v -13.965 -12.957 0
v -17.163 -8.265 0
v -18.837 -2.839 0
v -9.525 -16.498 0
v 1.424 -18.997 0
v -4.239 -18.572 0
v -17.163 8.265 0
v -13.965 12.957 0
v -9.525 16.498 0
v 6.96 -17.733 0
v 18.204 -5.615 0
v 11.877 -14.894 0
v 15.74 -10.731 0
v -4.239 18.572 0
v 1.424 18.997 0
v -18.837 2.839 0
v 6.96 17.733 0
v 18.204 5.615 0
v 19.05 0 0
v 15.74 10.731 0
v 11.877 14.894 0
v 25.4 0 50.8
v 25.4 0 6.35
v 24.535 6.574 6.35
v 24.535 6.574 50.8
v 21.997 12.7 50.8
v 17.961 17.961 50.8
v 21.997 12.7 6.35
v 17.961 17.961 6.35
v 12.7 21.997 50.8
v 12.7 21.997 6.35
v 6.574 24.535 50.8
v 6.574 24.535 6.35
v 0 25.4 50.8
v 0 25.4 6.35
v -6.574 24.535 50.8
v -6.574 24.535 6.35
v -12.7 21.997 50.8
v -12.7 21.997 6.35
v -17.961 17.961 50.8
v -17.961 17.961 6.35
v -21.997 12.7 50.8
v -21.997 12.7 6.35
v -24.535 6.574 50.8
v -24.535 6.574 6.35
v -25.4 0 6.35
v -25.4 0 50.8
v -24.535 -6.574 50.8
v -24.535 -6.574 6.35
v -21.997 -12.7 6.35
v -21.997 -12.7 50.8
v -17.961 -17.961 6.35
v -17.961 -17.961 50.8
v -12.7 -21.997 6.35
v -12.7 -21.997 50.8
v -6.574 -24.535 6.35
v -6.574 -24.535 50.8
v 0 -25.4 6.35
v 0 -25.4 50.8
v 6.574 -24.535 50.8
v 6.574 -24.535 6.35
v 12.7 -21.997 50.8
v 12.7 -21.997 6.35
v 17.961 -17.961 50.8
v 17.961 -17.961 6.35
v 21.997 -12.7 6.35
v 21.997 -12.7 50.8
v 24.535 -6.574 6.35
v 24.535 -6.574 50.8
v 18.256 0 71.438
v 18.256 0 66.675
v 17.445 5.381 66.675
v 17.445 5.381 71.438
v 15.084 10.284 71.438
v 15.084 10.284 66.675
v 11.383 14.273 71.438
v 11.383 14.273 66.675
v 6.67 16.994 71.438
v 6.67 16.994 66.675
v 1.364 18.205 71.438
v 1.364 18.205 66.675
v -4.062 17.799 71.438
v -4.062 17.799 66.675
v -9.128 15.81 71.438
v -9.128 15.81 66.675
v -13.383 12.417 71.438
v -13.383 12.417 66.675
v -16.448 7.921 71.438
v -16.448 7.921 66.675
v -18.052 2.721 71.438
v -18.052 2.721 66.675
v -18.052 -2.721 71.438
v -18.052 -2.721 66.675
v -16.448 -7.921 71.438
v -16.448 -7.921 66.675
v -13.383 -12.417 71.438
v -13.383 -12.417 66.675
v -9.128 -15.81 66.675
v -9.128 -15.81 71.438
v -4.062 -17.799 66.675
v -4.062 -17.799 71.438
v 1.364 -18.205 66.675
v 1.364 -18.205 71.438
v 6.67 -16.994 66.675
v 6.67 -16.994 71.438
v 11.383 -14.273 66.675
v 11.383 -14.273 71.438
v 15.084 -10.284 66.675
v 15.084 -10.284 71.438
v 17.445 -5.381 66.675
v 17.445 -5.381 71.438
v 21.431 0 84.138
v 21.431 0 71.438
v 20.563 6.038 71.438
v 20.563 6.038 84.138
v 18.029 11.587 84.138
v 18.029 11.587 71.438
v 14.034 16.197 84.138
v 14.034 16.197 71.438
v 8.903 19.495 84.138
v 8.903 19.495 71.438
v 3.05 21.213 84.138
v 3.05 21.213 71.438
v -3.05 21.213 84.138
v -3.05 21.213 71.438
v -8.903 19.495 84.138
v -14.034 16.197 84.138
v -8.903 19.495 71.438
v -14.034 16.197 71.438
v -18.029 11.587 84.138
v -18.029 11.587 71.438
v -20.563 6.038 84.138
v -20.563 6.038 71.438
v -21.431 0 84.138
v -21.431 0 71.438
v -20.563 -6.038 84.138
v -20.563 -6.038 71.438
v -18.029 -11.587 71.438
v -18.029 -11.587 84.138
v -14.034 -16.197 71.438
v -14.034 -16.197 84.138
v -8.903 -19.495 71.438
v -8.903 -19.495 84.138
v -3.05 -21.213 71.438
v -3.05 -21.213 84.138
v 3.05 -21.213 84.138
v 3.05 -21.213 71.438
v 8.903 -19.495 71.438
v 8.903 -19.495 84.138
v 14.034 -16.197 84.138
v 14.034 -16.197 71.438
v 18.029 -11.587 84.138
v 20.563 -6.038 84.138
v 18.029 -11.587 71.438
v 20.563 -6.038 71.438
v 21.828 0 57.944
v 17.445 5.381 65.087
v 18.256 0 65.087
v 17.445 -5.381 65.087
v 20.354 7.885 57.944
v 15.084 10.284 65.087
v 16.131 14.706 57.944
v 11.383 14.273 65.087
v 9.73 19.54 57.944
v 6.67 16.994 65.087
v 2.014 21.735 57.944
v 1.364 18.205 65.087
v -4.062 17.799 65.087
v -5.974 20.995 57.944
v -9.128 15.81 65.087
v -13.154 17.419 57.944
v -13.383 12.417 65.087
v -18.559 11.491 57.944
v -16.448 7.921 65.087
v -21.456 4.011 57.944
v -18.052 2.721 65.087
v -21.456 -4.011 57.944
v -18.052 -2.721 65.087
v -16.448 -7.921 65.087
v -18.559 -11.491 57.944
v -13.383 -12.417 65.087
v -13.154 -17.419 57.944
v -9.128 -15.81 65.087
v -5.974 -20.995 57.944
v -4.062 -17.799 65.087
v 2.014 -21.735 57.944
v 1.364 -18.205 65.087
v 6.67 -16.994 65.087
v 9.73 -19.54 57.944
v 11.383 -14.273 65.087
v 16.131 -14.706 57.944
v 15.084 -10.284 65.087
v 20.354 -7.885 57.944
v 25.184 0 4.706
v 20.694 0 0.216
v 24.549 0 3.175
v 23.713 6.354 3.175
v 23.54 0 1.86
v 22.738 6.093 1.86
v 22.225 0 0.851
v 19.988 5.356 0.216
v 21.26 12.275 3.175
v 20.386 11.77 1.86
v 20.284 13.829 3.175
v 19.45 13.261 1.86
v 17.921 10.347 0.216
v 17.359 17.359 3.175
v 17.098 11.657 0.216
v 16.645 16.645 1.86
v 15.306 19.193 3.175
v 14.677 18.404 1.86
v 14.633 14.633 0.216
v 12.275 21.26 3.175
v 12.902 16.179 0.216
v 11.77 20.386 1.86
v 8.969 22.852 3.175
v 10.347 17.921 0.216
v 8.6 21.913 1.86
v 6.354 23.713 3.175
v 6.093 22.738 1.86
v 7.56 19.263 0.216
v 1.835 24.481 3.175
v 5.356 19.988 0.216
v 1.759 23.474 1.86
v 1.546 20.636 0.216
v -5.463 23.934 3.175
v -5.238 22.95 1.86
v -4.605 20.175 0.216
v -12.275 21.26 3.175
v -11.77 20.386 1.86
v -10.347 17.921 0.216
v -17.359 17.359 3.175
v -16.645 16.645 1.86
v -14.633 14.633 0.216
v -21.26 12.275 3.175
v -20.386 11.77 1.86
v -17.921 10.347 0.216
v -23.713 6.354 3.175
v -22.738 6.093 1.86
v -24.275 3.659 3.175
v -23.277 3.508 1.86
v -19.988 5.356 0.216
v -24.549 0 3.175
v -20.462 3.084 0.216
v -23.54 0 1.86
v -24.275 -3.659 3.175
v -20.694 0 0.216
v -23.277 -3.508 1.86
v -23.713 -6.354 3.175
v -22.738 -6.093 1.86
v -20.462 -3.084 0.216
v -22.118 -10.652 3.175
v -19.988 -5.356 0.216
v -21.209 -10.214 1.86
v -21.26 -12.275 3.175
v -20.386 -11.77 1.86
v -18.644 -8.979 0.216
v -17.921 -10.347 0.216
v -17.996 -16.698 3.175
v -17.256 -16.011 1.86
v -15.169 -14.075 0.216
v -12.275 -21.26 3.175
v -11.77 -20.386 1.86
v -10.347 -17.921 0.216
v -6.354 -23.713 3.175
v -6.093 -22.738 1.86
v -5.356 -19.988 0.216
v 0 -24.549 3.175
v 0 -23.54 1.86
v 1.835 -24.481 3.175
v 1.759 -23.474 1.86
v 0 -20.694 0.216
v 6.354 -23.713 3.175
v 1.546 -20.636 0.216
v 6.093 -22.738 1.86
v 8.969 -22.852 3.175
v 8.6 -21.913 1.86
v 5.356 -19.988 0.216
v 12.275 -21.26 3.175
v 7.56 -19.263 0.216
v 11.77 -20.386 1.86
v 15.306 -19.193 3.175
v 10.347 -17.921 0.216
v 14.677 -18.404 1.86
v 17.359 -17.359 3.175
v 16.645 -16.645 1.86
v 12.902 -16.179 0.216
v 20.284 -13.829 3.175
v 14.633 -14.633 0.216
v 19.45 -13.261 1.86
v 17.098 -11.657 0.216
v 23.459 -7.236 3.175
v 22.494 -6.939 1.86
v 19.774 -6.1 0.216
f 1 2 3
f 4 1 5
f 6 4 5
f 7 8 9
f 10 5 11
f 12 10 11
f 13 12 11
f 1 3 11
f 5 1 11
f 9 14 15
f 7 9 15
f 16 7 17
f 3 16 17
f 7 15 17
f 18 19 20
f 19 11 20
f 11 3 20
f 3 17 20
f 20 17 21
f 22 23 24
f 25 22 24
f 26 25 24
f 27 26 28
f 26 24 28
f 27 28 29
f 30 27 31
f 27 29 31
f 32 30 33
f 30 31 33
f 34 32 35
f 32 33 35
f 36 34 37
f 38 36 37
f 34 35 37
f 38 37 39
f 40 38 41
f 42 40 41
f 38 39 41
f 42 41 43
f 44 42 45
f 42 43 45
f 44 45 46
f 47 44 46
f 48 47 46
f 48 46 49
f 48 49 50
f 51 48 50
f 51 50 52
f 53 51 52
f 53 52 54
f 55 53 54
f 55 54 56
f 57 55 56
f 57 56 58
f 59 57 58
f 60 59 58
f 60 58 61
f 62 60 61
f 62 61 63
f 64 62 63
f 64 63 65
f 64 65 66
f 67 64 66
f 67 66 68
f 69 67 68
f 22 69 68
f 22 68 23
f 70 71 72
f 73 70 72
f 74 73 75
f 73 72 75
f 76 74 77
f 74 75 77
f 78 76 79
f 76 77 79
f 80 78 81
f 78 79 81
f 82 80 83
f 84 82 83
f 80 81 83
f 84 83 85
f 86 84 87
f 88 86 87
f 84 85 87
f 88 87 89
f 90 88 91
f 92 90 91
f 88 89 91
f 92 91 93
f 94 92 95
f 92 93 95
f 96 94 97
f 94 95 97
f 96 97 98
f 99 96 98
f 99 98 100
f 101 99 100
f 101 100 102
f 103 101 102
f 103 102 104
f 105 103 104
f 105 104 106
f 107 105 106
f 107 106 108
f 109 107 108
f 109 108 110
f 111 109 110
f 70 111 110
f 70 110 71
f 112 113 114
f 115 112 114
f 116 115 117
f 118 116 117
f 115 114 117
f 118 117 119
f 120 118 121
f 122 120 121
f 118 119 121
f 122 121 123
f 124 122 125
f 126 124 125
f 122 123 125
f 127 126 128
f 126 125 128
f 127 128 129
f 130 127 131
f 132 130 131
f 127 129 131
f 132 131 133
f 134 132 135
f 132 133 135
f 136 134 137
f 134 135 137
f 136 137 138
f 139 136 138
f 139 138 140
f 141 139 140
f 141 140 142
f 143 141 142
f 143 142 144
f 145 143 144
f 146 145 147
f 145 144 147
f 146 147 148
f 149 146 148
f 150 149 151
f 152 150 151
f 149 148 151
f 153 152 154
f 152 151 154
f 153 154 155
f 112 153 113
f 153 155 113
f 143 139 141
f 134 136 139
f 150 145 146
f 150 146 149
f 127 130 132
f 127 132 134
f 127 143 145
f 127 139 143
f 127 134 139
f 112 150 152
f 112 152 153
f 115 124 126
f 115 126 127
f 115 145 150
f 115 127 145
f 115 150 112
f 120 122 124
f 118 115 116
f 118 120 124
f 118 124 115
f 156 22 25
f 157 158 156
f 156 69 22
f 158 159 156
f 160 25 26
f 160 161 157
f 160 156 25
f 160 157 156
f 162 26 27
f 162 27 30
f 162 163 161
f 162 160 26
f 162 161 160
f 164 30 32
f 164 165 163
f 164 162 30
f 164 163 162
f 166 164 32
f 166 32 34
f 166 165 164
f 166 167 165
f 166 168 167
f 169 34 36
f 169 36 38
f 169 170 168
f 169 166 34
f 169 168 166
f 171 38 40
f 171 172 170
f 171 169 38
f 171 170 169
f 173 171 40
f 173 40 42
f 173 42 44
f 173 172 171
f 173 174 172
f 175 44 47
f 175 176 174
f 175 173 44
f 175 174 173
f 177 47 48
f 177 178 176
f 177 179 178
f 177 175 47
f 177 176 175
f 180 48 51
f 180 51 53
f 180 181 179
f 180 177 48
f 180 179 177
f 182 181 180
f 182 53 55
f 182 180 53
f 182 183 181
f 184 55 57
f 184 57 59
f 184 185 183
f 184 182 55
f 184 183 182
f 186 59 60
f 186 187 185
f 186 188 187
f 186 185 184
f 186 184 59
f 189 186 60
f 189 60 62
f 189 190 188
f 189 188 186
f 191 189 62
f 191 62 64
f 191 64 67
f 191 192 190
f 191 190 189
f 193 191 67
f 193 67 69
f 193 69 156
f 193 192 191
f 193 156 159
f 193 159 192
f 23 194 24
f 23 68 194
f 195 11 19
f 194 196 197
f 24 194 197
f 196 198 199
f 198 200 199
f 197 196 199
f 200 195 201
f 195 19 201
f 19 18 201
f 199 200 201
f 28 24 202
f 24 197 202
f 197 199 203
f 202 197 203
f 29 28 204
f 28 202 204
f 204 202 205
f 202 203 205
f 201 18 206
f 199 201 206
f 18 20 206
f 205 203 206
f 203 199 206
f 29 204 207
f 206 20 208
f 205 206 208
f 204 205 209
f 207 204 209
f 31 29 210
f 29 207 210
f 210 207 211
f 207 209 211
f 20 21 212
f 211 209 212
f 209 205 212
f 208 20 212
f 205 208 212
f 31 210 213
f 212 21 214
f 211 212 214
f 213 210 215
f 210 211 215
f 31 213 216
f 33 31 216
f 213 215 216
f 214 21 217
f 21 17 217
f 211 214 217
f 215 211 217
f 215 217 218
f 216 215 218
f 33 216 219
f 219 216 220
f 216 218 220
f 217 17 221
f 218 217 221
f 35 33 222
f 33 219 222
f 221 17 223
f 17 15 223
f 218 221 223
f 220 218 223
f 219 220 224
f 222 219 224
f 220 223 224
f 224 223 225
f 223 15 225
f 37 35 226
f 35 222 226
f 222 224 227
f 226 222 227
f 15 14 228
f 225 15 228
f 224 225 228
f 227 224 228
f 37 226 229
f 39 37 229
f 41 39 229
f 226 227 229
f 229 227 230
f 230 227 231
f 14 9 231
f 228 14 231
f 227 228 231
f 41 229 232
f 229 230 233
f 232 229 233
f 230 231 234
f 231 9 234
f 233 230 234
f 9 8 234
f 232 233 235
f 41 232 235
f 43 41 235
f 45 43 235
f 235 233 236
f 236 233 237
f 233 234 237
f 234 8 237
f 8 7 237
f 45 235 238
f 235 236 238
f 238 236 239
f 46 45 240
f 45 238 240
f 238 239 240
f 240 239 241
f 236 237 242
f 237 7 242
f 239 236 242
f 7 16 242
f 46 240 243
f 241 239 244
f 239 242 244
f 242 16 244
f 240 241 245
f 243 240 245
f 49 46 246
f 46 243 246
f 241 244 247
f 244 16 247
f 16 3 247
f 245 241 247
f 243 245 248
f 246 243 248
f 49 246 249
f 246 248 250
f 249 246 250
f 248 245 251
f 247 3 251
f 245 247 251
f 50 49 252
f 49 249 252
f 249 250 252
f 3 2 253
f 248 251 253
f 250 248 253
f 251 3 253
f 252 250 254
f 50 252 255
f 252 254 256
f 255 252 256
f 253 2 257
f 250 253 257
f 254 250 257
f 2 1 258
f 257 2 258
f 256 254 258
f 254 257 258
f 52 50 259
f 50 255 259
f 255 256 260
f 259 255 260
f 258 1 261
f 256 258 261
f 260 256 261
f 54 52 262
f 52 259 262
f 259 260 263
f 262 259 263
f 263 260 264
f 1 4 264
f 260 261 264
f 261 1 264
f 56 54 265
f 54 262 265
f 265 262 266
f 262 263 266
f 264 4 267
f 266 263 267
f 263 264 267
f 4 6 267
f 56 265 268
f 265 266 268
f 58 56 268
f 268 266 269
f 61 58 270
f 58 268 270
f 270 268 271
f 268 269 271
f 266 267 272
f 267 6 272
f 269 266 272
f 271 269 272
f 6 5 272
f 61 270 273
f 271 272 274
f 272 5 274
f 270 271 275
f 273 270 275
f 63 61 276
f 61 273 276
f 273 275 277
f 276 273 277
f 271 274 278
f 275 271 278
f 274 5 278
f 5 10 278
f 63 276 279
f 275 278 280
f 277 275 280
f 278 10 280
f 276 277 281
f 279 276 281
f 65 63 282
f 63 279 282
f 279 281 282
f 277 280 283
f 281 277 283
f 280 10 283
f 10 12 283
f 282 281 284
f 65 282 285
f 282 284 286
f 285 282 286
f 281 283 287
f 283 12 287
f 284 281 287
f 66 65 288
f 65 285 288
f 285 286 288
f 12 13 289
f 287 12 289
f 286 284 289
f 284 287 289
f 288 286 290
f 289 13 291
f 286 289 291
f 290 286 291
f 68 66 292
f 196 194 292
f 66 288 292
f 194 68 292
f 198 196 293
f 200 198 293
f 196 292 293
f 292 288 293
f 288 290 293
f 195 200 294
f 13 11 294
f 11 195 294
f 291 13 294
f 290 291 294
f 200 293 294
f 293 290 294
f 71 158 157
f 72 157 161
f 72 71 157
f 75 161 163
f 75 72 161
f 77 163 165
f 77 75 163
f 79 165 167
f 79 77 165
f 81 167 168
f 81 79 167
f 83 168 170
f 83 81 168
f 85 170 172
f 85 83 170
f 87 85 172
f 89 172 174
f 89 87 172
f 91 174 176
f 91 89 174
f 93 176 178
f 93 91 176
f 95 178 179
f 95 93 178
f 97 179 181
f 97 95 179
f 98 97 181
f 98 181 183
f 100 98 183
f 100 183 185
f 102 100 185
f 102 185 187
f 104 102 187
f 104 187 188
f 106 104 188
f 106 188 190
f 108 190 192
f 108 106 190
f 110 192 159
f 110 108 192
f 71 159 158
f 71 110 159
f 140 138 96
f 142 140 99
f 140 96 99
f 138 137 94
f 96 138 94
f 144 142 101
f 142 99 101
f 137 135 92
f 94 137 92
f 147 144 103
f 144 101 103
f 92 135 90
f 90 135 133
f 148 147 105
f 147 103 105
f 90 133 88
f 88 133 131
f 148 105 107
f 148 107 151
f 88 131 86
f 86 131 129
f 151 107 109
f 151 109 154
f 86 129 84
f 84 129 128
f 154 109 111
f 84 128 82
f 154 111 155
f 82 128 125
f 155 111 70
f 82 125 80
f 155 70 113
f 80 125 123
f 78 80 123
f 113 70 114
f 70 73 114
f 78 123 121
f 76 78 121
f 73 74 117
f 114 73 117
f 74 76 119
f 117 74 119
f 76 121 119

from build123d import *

# Parameters (mm, degrees)
F0_R        = 25.4
F0_R_2      = 21.43125
F0_R_3      = 18.25625
F1_DEPTH    = 66.675
F2_DEPTH    = 84.1375
F3_R        = 6.35
F4_S5_R     = 18.25625
F4_T6_DEPTH = 38
F5_START    = 71.4375
F5_DEPTH    = 12.7


# Not quite as in the source:
# - a fillet or chamfer that OpenCascade refuses, or shapes differently, is made with other operations: its cross-section is extruded or revolved along the edge and cut away or added


with BuildPart() as f1:
    # F0 (on Top) → F1 (new body)
    with BuildSketch(Plane.XY):
        Circle(F0_R)
        Circle(F0_R_2, mode=Mode.SUBTRACT)
        Circle(F0_R_2)
        Circle(F0_R_3, mode=Mode.SUBTRACT)
    extrude(amount=F1_DEPTH)

    # F0 (on Top) → F2 (join)
    with BuildSketch(Plane.XY):
        Circle(F0_R_3)
    extrude(amount=F2_DEPTH)

    # F3
    f3_edges = [f1.edges().sort_by_distance(p)[0] for p in [
        (-25.4, 0, 0),
    ]]
    fillet(f3_edges, radius=F3_R)

    # F4: chamfer of 7.9375 x 15.875 on 1 edges, made by hand


with BuildPart() as f4_tool2:
    # F4_s3 → F4_t4 (revolve)
    with BuildSketch(Plane.XZ):
        Polygon((25.4, 50.8), (17.4625, 66.675), (25.4, 66.675), align=None)
    revolve(axis=Axis((0, 0, 66.675), (0, 0, 1)))

    # F4_s5 → F4_t6 (cut, symmetric)
    with BuildSketch(Plane.XY.offset(58.7)):
        Circle(F4_S5_R)
    extrude(amount=F4_T6_DEPTH, both=True, mode=Mode.SUBTRACT)


with BuildPart() as f1_1:
    add(f1.part)

    # F4_t1: cut F4_tool2
    add(f4_tool2.part, mode=Mode.SUBTRACT)

    # F0 (on Top) → F5 (join)
    with BuildSketch(Plane.XY.offset(F5_START)):
        Circle(F0_R_2)
        Circle(F0_R_3, mode=Mode.SUBTRACT)
    extrude(amount=F5_DEPTH)


solid = f1_1.part
